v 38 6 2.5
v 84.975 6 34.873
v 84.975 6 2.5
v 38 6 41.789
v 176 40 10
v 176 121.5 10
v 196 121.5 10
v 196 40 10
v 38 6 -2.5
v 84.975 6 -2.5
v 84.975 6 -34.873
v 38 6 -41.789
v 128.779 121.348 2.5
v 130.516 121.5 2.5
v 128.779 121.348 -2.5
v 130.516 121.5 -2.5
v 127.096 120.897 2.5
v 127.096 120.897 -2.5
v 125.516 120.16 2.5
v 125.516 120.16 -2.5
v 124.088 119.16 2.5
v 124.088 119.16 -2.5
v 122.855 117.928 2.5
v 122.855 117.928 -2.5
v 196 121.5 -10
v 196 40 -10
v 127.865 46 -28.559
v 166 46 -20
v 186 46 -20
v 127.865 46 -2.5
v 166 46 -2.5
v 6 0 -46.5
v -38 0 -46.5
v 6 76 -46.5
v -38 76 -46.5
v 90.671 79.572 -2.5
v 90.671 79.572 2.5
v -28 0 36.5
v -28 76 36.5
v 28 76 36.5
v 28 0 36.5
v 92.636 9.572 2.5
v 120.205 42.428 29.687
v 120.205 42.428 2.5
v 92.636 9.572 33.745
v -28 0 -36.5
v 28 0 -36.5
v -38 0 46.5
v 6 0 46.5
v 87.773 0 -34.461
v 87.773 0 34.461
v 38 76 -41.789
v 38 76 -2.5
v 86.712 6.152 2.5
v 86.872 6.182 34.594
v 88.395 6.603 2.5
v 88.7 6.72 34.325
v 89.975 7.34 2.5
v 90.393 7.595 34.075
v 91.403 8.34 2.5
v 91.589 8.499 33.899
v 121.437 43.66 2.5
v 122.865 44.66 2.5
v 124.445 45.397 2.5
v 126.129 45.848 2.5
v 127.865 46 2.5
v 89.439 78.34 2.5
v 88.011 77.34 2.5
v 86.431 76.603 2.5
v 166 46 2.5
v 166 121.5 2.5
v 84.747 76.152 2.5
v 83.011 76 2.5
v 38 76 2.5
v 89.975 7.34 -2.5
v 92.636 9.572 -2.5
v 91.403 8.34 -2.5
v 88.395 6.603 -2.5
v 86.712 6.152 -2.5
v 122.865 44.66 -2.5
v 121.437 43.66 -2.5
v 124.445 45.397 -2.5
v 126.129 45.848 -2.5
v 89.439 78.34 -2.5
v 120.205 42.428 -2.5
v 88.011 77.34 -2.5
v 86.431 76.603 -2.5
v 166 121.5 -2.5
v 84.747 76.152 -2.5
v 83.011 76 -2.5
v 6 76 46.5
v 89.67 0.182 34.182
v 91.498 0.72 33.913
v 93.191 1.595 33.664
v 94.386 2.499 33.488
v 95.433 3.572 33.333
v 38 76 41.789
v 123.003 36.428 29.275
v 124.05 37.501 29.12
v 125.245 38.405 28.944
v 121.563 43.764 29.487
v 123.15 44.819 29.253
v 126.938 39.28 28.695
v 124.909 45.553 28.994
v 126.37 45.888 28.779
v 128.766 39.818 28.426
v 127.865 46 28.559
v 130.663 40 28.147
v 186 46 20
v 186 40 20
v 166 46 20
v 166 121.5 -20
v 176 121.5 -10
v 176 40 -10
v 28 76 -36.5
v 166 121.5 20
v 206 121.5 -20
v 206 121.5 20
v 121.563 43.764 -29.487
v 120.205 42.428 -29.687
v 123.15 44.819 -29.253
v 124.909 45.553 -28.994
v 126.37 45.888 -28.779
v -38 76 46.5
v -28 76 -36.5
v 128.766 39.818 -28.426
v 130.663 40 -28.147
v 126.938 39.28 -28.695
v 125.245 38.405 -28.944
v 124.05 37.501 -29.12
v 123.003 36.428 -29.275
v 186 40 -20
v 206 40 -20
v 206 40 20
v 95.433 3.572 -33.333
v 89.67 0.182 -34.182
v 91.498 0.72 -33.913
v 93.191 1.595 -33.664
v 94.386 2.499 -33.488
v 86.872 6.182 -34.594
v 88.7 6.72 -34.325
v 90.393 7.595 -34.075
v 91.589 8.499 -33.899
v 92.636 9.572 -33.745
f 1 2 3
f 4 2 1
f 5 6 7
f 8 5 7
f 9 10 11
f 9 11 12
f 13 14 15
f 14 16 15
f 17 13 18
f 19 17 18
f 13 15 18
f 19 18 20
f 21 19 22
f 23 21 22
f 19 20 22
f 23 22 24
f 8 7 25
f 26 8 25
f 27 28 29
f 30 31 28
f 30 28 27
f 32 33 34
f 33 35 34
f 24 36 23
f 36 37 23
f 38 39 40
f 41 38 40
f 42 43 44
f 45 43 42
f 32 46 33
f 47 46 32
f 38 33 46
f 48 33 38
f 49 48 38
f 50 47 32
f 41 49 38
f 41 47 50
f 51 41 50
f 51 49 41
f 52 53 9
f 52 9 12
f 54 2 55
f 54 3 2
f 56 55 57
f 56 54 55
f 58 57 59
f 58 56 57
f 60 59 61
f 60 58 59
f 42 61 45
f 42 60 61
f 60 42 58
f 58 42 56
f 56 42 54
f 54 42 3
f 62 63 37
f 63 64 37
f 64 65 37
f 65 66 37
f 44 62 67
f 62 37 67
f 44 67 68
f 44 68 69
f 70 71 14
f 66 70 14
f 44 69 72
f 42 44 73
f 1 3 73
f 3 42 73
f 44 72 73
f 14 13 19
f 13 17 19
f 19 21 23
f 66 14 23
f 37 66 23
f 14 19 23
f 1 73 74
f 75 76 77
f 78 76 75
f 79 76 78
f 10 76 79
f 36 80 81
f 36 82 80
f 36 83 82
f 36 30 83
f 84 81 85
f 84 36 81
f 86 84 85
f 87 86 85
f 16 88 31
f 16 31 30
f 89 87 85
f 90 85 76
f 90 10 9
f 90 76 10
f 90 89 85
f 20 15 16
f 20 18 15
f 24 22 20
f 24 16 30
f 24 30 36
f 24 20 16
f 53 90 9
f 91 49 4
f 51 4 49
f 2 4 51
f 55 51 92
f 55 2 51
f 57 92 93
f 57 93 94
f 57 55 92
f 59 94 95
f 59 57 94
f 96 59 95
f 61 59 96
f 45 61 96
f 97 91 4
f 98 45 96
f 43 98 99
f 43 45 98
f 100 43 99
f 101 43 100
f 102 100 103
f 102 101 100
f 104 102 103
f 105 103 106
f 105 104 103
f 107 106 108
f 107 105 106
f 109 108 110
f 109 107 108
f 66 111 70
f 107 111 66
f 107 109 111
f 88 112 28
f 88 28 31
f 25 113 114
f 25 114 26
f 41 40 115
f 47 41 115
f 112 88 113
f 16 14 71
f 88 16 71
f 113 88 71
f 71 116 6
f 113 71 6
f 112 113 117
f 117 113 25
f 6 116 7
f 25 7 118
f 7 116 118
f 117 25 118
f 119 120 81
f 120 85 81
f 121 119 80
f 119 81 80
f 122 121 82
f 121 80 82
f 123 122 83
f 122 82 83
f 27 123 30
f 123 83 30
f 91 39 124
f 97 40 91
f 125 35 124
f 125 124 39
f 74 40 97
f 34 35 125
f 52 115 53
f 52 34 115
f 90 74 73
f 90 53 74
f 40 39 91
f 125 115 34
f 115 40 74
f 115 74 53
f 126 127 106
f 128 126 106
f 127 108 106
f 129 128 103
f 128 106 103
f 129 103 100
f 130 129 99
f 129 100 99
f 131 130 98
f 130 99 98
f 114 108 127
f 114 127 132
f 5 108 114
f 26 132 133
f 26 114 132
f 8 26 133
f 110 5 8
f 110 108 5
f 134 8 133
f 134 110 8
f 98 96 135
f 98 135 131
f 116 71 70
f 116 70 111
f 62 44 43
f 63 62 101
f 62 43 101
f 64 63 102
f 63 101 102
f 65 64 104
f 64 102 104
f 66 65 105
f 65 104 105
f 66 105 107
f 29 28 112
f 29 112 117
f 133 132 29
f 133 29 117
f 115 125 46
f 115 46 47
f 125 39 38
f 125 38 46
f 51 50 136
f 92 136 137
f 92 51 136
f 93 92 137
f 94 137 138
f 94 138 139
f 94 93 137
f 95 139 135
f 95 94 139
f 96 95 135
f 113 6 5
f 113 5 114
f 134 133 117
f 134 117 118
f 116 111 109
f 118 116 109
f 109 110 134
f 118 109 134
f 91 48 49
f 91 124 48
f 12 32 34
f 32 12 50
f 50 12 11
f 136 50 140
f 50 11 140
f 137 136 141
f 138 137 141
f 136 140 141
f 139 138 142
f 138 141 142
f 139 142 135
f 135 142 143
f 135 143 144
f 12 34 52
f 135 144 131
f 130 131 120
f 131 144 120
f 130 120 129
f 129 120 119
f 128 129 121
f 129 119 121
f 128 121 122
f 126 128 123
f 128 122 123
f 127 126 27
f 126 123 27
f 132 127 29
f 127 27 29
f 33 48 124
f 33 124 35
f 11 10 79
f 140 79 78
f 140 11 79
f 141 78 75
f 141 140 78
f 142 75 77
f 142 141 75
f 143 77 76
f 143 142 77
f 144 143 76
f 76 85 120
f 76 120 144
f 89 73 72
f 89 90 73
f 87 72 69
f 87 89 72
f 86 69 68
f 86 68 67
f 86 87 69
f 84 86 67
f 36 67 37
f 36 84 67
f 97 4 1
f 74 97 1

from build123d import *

# Parameters (mm, degrees)
SKIZZE1_W                       = 76
SKIZZE1_H                       = 93
AUFSATZ_LINEAR_AUSTRAGEN1_DEPTH = 76
AUFSATZ_LINEAR_AUSTRAGEN2_DEPTH = 46.5
SKIZZE3_W                       = 40
SKIZZE3_H                       = 40
AUFSATZ_LINEAR_AUSTRAGEN3_DEPTH = 81.5
AUFSATZ_LINEAR_AUSTRAGEN4_DEPTH = 2.5
SKIZZE5_W                       = 20
SKIZZE5_H                       = 20
SCHNITT_LINEAR_AUSTRAGEN1_DEPTH = 122.5
SKIZZE6_W                       = 56
SKIZZE6_H                       = 73
SCHNITT_LINEAR_AUSTRAGEN2_DEPTH = 77
SCHNITT_LINEAR_AUSTRAGEN3_DEPTH = 122.5
VERRUNDUNG1_R                   = 10


with BuildPart() as part:
    # Skizze1 → Aufsatz-Linear austragen1 (new body)
    with BuildSketch(Plane(origin=(0, 0, 0), x_dir=(1, 0, 0), z_dir=(0, 1, 0))):
        Rectangle(SKIZZE1_W, SKIZZE1_H)
    extrude(amount=AUFSATZ_LINEAR_AUSTRAGEN1_DEPTH)

    # Skizze2 → Aufsatz-Linear austragen2 (add, symmetric)
    with BuildSketch(Plane.XY):
        Polygon((38, 0), (92.436014753, 0), (126, 40), (186, 40), (186, 46), (123.202154051, 46), (89.638168804, 6), (38, 6), align=None)
    extrude(amount=AUFSATZ_LINEAR_AUSTRAGEN2_DEPTH, both=True)

    # Skizze3 → Aufsatz-Linear austragen3 (add)
    with BuildSketch(Plane.XZ.offset(-40)):
        with Locations((186, 0)):
            Rectangle(SKIZZE3_W, SKIZZE3_H)
    extrude(amount=-AUFSATZ_LINEAR_AUSTRAGEN3_DEPTH)

    # Skizze4 → Aufsatz-Linear austragen4 (add, symmetric)
    with BuildSketch(Plane.XY):
        Polygon((38, 76), (87.673704032, 76), (125.852737251, 121.5), (166, 121.5), (166, 46), (123.202154051, 46), (89.638168804, 6), (38, 6), align=None)
    extrude(amount=AUFSATZ_LINEAR_AUSTRAGEN4_DEPTH, both=True)

    # Skizze5 → Schnitt-Linear austragen1 (cut, through all)
    with BuildSketch(Plane(origin=(0, 121.5, 0), x_dir=(1, 0, 0), z_dir=(0, 1, 0))):
        with Locations((186, 0)):
            Rectangle(SKIZZE5_W, SKIZZE5_H)
    extrude(amount=-SCHNITT_LINEAR_AUSTRAGEN1_DEPTH, mode=Mode.SUBTRACT)

    # Skizze6 → Schnitt-Linear austragen2 (cut, through all)
    with BuildSketch(Plane(origin=(0, 76, 0), x_dir=(1, 0, 0), z_dir=(0, 1, 0))):
        Rectangle(SKIZZE6_W, SKIZZE6_H)
    extrude(amount=-SCHNITT_LINEAR_AUSTRAGEN2_DEPTH, mode=Mode.SUBTRACT)

    # Skizze7 → Schnitt-Linear austragen3 (cut, through all)
    with BuildSketch(Plane(origin=(0, 121.5, 0), x_dir=(1, 0, 0), z_dir=(0, 1, 0))):
        Polygon((6, 46.5), (186, 20), (186, 46.5), align=None)
        Polygon((6, -46.5), (186, -20), (186, -46.5), align=None)
    extrude(amount=-SCHNITT_LINEAR_AUSTRAGEN3_DEPTH, mode=Mode.SUBTRACT)

    # Verrundung1
    verrundung1_edges = [part.edges().sort_by_distance(p)[0] for p in [
        (126, 40, 0),
        (92.436014753, 0, 0),
        (89.638168804, 6, 18.343301463),
        (123.202154051, 46, 15.872619216),
        (89.638168804, 6, -18.343301463),
        (123.202154051, 46, -15.872619216),
        (125.852737251, 121.5, 0),
        (87.673704032, 76, 0),
    ]]
    fillet(verrundung1_edges, radius=VERRUNDUNG1_R)


solid = part.part
